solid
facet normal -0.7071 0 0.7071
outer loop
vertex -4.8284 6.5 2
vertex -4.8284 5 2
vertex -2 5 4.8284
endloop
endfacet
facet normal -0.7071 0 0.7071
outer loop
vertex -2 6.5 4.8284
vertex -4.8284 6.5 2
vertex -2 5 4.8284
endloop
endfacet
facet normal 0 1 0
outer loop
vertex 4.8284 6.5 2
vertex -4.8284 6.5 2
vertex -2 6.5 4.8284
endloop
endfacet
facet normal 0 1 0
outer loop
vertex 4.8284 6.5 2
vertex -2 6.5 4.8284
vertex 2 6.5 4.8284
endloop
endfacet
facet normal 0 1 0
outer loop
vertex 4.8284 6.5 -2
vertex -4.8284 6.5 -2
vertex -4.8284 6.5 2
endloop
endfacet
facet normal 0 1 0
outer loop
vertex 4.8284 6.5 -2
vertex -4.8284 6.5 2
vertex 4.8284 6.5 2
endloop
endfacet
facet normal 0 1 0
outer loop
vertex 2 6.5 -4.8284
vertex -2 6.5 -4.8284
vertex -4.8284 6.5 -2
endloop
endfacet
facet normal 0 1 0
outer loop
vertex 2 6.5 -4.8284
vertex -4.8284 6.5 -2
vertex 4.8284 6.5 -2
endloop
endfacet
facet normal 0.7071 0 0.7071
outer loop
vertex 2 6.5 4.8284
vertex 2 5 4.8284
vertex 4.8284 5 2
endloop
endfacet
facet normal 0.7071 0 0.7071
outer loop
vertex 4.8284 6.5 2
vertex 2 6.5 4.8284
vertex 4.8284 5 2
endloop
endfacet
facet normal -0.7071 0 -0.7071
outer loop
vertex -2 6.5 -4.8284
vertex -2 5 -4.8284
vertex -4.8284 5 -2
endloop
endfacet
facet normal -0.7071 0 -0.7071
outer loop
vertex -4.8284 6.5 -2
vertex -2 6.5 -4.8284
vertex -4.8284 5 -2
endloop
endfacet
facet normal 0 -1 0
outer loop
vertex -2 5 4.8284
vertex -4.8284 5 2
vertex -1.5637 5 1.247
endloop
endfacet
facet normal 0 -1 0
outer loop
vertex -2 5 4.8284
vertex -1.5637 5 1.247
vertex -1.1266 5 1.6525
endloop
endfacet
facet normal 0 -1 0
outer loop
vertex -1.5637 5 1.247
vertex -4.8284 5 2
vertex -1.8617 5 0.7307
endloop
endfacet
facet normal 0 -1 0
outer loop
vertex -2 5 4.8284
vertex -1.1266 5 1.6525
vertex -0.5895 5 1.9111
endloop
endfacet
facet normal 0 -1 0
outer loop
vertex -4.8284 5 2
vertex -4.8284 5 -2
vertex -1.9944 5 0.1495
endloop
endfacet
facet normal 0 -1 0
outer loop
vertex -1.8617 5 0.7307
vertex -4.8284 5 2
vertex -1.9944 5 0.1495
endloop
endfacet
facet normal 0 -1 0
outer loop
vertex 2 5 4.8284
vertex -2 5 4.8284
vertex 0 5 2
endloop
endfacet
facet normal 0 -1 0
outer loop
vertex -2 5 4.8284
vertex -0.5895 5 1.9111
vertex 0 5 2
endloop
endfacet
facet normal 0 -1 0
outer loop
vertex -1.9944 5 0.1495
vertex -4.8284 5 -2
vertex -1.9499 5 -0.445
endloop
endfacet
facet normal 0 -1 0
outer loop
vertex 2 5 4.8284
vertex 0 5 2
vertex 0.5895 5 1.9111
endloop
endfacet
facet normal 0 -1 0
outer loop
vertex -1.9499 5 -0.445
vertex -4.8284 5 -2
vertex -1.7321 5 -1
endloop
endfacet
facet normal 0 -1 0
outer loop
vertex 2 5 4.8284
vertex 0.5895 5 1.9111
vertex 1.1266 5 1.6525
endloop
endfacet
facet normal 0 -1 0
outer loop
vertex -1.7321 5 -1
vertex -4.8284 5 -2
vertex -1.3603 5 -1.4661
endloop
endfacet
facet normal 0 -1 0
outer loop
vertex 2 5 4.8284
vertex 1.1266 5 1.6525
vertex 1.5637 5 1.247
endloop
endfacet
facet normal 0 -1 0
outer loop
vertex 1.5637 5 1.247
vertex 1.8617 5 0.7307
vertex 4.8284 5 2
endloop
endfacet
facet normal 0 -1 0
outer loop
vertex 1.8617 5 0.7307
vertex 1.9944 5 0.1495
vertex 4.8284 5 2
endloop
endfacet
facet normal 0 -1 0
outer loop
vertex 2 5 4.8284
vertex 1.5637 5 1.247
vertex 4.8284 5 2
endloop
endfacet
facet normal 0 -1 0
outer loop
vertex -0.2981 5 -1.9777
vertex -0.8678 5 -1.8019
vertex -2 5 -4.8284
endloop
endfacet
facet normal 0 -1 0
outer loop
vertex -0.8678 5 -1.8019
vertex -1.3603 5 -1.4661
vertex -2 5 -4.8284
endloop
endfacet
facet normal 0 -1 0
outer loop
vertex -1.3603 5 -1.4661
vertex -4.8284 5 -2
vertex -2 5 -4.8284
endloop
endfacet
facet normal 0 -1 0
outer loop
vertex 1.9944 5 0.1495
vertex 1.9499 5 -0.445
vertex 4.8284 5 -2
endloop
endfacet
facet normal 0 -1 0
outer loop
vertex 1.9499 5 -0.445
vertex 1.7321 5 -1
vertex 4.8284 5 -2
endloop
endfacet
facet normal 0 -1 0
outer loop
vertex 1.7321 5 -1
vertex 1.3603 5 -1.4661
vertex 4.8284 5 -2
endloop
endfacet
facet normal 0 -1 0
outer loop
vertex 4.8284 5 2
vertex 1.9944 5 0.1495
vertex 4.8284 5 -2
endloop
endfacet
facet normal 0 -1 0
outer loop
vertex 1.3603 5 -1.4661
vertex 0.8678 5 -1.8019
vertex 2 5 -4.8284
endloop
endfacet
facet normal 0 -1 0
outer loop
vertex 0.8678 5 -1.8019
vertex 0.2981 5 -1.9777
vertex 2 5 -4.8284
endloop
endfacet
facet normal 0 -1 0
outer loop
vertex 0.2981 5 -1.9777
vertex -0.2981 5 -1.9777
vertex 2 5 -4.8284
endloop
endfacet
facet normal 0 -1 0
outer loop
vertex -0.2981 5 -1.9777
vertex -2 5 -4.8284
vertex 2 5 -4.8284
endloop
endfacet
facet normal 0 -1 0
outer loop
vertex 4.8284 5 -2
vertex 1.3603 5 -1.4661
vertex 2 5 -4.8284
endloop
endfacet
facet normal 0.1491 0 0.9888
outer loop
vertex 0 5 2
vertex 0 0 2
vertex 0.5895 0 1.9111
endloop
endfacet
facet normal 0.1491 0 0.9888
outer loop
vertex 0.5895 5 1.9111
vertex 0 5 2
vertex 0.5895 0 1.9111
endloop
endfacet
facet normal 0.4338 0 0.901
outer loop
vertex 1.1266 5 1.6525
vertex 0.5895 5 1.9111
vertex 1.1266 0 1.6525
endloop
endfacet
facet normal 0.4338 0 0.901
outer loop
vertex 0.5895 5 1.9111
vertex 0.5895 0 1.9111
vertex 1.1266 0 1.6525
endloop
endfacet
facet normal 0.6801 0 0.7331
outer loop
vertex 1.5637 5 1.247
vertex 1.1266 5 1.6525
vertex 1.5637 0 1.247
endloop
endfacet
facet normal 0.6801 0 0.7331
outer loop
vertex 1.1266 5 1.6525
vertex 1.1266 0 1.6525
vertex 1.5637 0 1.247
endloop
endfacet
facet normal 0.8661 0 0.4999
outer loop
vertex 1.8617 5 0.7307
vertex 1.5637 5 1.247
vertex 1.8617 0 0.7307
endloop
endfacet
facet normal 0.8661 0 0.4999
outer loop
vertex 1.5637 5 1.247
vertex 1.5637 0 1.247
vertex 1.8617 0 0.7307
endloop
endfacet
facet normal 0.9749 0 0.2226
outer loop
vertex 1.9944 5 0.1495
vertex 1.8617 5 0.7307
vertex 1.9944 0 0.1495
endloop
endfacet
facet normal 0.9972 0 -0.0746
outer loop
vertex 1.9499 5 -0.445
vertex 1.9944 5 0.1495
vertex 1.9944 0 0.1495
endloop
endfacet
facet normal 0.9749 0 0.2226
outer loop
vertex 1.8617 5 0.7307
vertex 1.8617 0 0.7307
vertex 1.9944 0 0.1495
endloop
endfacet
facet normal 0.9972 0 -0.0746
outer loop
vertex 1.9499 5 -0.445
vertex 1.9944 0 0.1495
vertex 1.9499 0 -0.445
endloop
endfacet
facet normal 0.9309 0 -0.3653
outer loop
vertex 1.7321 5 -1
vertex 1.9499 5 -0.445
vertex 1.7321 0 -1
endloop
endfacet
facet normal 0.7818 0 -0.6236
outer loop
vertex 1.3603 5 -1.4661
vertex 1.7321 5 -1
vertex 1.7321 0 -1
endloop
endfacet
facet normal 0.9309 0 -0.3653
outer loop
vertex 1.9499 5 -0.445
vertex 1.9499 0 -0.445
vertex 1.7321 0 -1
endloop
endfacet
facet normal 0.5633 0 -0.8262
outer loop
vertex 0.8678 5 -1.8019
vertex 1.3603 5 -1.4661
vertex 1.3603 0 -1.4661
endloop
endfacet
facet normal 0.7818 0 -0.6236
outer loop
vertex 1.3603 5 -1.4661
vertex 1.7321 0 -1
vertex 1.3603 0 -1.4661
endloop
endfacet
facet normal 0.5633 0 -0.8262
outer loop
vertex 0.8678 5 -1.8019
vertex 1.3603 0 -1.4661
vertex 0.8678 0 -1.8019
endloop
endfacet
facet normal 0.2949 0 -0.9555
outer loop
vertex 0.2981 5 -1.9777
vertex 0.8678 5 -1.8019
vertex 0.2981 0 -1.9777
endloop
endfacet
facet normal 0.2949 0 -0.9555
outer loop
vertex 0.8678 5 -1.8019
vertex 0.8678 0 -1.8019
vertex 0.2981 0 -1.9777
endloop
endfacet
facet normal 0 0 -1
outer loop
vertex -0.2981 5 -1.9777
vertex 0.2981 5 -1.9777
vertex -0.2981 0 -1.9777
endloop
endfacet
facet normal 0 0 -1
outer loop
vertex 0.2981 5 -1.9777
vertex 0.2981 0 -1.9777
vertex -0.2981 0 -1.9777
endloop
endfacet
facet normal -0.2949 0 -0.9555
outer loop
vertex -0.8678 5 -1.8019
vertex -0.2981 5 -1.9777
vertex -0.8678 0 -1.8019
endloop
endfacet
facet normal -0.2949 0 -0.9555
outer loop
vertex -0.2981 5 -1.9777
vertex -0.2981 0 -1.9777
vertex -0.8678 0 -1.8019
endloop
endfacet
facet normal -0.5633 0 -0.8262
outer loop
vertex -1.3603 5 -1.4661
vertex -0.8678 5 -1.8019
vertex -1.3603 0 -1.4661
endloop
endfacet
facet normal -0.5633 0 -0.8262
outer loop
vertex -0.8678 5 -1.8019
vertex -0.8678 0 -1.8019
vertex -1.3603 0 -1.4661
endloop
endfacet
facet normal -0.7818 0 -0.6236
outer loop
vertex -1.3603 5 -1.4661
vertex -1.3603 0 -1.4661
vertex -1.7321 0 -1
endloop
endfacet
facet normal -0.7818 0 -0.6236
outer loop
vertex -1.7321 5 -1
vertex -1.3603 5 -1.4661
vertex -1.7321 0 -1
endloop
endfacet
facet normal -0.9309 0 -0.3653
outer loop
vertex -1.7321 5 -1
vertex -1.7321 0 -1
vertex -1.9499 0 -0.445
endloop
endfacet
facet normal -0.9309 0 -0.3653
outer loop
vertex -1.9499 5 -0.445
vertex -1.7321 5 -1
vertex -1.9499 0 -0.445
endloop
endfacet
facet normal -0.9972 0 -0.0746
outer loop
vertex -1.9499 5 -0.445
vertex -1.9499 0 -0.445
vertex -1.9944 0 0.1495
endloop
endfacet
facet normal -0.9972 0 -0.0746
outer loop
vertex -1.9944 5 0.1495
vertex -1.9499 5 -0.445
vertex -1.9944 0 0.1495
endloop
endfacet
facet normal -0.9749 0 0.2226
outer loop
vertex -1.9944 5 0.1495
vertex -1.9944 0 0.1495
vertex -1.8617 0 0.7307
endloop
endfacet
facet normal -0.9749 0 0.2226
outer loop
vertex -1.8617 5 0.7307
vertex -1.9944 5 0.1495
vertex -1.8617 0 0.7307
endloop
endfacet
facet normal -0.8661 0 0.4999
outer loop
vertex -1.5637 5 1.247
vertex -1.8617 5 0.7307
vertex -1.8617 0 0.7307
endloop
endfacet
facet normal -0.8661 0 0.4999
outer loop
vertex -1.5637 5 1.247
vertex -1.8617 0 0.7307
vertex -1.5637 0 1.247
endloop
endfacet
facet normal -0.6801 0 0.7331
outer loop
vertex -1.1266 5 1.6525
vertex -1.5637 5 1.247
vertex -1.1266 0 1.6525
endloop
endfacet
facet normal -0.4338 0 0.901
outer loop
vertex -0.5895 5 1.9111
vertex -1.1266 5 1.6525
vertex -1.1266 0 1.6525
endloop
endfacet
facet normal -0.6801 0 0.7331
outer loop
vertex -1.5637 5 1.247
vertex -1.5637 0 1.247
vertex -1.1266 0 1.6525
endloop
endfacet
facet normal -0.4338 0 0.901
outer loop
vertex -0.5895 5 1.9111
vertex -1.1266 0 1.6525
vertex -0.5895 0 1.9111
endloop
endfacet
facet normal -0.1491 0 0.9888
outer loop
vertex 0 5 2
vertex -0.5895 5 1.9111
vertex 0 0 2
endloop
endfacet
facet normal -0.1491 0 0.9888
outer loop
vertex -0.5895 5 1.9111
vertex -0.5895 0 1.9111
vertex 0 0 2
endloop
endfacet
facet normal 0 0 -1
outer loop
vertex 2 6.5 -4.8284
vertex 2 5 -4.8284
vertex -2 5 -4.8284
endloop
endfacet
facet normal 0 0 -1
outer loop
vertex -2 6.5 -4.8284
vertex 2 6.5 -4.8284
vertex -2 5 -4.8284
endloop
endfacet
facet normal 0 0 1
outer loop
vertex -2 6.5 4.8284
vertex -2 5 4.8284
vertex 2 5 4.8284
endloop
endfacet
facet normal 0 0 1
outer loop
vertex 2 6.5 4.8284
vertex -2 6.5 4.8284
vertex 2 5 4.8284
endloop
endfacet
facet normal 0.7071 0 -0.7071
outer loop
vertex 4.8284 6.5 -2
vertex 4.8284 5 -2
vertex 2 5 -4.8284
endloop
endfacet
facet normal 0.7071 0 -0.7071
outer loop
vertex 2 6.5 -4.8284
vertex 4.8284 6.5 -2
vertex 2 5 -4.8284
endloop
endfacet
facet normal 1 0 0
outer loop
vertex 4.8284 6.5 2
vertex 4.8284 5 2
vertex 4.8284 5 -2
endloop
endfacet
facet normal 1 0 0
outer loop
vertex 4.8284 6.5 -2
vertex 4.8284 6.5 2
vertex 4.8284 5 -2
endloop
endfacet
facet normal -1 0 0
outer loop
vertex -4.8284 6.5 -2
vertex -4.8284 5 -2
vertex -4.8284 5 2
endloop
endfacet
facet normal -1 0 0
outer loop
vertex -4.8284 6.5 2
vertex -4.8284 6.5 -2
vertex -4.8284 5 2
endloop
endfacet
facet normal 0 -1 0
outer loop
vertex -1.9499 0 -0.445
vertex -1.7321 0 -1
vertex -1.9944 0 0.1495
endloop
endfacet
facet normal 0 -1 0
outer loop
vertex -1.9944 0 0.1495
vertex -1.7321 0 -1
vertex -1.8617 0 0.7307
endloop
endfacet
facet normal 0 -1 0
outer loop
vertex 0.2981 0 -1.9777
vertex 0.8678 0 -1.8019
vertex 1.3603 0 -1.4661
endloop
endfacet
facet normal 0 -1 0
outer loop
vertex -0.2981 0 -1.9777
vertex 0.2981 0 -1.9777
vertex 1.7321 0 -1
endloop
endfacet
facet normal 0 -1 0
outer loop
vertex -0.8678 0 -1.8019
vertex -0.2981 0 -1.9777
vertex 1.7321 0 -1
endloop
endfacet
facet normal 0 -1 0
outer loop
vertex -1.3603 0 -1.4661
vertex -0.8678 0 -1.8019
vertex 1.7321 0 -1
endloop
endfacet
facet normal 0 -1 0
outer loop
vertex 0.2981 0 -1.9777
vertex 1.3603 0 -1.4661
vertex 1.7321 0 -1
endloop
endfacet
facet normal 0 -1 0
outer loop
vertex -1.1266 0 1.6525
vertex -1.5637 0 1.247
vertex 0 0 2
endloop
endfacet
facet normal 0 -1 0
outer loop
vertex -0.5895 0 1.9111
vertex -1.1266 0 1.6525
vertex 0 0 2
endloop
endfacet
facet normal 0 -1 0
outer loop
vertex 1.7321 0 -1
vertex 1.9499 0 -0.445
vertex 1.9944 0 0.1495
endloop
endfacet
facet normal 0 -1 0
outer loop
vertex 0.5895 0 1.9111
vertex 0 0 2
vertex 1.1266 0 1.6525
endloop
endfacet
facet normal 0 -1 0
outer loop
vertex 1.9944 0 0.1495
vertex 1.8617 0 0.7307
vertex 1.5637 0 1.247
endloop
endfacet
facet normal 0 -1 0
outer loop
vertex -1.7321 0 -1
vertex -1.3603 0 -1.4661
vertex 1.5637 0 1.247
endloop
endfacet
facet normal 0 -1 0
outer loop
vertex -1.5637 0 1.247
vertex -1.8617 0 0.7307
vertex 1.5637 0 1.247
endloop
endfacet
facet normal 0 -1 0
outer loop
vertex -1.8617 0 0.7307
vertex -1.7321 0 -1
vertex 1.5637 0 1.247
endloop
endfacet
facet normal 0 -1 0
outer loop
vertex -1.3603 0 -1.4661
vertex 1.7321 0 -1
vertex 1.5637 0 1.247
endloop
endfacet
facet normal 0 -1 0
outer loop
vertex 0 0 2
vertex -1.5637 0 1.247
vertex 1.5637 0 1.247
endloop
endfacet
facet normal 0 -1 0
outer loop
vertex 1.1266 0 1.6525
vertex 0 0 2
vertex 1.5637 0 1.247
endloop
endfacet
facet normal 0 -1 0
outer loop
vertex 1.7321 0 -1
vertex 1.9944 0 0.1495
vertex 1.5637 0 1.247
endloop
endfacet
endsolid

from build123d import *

# Parameters (mm, degrees)
SKETCH1_R           = 2
BOSS_EXTRUDE1_DEPTH = 5
BOSS_EXTRUDE2_DEPTH = 1.5


with BuildPart() as part:
    # Sketch1 → Boss-Extrude1 (new body)
    with BuildSketch(Plane(origin=(0, 0, 0), x_dir=(1, 0, 0), z_dir=(0, 1, 0))):
        with Locations(Location((0, 0, 0), (0, 0, 270))):
            Circle(SKETCH1_R)
    extrude(amount=BOSS_EXTRUDE1_DEPTH)

    # Sketch2 → Boss-Extrude2 (add)
    with BuildSketch(Plane(origin=(0, 5, 0), x_dir=(1, 0, 0), z_dir=(0, 1, 0))):
        Polygon((4.828427125, 2), (2, 4.828427125), (-2, 4.828427125), (-4.828427125, 2), (-4.828427125, -2), (-2, -4.828427125), (2, -4.828427125), (4.828427125, -2), align=None)
    extrude(amount=BOSS_EXTRUDE2_DEPTH)


solid = part.part
